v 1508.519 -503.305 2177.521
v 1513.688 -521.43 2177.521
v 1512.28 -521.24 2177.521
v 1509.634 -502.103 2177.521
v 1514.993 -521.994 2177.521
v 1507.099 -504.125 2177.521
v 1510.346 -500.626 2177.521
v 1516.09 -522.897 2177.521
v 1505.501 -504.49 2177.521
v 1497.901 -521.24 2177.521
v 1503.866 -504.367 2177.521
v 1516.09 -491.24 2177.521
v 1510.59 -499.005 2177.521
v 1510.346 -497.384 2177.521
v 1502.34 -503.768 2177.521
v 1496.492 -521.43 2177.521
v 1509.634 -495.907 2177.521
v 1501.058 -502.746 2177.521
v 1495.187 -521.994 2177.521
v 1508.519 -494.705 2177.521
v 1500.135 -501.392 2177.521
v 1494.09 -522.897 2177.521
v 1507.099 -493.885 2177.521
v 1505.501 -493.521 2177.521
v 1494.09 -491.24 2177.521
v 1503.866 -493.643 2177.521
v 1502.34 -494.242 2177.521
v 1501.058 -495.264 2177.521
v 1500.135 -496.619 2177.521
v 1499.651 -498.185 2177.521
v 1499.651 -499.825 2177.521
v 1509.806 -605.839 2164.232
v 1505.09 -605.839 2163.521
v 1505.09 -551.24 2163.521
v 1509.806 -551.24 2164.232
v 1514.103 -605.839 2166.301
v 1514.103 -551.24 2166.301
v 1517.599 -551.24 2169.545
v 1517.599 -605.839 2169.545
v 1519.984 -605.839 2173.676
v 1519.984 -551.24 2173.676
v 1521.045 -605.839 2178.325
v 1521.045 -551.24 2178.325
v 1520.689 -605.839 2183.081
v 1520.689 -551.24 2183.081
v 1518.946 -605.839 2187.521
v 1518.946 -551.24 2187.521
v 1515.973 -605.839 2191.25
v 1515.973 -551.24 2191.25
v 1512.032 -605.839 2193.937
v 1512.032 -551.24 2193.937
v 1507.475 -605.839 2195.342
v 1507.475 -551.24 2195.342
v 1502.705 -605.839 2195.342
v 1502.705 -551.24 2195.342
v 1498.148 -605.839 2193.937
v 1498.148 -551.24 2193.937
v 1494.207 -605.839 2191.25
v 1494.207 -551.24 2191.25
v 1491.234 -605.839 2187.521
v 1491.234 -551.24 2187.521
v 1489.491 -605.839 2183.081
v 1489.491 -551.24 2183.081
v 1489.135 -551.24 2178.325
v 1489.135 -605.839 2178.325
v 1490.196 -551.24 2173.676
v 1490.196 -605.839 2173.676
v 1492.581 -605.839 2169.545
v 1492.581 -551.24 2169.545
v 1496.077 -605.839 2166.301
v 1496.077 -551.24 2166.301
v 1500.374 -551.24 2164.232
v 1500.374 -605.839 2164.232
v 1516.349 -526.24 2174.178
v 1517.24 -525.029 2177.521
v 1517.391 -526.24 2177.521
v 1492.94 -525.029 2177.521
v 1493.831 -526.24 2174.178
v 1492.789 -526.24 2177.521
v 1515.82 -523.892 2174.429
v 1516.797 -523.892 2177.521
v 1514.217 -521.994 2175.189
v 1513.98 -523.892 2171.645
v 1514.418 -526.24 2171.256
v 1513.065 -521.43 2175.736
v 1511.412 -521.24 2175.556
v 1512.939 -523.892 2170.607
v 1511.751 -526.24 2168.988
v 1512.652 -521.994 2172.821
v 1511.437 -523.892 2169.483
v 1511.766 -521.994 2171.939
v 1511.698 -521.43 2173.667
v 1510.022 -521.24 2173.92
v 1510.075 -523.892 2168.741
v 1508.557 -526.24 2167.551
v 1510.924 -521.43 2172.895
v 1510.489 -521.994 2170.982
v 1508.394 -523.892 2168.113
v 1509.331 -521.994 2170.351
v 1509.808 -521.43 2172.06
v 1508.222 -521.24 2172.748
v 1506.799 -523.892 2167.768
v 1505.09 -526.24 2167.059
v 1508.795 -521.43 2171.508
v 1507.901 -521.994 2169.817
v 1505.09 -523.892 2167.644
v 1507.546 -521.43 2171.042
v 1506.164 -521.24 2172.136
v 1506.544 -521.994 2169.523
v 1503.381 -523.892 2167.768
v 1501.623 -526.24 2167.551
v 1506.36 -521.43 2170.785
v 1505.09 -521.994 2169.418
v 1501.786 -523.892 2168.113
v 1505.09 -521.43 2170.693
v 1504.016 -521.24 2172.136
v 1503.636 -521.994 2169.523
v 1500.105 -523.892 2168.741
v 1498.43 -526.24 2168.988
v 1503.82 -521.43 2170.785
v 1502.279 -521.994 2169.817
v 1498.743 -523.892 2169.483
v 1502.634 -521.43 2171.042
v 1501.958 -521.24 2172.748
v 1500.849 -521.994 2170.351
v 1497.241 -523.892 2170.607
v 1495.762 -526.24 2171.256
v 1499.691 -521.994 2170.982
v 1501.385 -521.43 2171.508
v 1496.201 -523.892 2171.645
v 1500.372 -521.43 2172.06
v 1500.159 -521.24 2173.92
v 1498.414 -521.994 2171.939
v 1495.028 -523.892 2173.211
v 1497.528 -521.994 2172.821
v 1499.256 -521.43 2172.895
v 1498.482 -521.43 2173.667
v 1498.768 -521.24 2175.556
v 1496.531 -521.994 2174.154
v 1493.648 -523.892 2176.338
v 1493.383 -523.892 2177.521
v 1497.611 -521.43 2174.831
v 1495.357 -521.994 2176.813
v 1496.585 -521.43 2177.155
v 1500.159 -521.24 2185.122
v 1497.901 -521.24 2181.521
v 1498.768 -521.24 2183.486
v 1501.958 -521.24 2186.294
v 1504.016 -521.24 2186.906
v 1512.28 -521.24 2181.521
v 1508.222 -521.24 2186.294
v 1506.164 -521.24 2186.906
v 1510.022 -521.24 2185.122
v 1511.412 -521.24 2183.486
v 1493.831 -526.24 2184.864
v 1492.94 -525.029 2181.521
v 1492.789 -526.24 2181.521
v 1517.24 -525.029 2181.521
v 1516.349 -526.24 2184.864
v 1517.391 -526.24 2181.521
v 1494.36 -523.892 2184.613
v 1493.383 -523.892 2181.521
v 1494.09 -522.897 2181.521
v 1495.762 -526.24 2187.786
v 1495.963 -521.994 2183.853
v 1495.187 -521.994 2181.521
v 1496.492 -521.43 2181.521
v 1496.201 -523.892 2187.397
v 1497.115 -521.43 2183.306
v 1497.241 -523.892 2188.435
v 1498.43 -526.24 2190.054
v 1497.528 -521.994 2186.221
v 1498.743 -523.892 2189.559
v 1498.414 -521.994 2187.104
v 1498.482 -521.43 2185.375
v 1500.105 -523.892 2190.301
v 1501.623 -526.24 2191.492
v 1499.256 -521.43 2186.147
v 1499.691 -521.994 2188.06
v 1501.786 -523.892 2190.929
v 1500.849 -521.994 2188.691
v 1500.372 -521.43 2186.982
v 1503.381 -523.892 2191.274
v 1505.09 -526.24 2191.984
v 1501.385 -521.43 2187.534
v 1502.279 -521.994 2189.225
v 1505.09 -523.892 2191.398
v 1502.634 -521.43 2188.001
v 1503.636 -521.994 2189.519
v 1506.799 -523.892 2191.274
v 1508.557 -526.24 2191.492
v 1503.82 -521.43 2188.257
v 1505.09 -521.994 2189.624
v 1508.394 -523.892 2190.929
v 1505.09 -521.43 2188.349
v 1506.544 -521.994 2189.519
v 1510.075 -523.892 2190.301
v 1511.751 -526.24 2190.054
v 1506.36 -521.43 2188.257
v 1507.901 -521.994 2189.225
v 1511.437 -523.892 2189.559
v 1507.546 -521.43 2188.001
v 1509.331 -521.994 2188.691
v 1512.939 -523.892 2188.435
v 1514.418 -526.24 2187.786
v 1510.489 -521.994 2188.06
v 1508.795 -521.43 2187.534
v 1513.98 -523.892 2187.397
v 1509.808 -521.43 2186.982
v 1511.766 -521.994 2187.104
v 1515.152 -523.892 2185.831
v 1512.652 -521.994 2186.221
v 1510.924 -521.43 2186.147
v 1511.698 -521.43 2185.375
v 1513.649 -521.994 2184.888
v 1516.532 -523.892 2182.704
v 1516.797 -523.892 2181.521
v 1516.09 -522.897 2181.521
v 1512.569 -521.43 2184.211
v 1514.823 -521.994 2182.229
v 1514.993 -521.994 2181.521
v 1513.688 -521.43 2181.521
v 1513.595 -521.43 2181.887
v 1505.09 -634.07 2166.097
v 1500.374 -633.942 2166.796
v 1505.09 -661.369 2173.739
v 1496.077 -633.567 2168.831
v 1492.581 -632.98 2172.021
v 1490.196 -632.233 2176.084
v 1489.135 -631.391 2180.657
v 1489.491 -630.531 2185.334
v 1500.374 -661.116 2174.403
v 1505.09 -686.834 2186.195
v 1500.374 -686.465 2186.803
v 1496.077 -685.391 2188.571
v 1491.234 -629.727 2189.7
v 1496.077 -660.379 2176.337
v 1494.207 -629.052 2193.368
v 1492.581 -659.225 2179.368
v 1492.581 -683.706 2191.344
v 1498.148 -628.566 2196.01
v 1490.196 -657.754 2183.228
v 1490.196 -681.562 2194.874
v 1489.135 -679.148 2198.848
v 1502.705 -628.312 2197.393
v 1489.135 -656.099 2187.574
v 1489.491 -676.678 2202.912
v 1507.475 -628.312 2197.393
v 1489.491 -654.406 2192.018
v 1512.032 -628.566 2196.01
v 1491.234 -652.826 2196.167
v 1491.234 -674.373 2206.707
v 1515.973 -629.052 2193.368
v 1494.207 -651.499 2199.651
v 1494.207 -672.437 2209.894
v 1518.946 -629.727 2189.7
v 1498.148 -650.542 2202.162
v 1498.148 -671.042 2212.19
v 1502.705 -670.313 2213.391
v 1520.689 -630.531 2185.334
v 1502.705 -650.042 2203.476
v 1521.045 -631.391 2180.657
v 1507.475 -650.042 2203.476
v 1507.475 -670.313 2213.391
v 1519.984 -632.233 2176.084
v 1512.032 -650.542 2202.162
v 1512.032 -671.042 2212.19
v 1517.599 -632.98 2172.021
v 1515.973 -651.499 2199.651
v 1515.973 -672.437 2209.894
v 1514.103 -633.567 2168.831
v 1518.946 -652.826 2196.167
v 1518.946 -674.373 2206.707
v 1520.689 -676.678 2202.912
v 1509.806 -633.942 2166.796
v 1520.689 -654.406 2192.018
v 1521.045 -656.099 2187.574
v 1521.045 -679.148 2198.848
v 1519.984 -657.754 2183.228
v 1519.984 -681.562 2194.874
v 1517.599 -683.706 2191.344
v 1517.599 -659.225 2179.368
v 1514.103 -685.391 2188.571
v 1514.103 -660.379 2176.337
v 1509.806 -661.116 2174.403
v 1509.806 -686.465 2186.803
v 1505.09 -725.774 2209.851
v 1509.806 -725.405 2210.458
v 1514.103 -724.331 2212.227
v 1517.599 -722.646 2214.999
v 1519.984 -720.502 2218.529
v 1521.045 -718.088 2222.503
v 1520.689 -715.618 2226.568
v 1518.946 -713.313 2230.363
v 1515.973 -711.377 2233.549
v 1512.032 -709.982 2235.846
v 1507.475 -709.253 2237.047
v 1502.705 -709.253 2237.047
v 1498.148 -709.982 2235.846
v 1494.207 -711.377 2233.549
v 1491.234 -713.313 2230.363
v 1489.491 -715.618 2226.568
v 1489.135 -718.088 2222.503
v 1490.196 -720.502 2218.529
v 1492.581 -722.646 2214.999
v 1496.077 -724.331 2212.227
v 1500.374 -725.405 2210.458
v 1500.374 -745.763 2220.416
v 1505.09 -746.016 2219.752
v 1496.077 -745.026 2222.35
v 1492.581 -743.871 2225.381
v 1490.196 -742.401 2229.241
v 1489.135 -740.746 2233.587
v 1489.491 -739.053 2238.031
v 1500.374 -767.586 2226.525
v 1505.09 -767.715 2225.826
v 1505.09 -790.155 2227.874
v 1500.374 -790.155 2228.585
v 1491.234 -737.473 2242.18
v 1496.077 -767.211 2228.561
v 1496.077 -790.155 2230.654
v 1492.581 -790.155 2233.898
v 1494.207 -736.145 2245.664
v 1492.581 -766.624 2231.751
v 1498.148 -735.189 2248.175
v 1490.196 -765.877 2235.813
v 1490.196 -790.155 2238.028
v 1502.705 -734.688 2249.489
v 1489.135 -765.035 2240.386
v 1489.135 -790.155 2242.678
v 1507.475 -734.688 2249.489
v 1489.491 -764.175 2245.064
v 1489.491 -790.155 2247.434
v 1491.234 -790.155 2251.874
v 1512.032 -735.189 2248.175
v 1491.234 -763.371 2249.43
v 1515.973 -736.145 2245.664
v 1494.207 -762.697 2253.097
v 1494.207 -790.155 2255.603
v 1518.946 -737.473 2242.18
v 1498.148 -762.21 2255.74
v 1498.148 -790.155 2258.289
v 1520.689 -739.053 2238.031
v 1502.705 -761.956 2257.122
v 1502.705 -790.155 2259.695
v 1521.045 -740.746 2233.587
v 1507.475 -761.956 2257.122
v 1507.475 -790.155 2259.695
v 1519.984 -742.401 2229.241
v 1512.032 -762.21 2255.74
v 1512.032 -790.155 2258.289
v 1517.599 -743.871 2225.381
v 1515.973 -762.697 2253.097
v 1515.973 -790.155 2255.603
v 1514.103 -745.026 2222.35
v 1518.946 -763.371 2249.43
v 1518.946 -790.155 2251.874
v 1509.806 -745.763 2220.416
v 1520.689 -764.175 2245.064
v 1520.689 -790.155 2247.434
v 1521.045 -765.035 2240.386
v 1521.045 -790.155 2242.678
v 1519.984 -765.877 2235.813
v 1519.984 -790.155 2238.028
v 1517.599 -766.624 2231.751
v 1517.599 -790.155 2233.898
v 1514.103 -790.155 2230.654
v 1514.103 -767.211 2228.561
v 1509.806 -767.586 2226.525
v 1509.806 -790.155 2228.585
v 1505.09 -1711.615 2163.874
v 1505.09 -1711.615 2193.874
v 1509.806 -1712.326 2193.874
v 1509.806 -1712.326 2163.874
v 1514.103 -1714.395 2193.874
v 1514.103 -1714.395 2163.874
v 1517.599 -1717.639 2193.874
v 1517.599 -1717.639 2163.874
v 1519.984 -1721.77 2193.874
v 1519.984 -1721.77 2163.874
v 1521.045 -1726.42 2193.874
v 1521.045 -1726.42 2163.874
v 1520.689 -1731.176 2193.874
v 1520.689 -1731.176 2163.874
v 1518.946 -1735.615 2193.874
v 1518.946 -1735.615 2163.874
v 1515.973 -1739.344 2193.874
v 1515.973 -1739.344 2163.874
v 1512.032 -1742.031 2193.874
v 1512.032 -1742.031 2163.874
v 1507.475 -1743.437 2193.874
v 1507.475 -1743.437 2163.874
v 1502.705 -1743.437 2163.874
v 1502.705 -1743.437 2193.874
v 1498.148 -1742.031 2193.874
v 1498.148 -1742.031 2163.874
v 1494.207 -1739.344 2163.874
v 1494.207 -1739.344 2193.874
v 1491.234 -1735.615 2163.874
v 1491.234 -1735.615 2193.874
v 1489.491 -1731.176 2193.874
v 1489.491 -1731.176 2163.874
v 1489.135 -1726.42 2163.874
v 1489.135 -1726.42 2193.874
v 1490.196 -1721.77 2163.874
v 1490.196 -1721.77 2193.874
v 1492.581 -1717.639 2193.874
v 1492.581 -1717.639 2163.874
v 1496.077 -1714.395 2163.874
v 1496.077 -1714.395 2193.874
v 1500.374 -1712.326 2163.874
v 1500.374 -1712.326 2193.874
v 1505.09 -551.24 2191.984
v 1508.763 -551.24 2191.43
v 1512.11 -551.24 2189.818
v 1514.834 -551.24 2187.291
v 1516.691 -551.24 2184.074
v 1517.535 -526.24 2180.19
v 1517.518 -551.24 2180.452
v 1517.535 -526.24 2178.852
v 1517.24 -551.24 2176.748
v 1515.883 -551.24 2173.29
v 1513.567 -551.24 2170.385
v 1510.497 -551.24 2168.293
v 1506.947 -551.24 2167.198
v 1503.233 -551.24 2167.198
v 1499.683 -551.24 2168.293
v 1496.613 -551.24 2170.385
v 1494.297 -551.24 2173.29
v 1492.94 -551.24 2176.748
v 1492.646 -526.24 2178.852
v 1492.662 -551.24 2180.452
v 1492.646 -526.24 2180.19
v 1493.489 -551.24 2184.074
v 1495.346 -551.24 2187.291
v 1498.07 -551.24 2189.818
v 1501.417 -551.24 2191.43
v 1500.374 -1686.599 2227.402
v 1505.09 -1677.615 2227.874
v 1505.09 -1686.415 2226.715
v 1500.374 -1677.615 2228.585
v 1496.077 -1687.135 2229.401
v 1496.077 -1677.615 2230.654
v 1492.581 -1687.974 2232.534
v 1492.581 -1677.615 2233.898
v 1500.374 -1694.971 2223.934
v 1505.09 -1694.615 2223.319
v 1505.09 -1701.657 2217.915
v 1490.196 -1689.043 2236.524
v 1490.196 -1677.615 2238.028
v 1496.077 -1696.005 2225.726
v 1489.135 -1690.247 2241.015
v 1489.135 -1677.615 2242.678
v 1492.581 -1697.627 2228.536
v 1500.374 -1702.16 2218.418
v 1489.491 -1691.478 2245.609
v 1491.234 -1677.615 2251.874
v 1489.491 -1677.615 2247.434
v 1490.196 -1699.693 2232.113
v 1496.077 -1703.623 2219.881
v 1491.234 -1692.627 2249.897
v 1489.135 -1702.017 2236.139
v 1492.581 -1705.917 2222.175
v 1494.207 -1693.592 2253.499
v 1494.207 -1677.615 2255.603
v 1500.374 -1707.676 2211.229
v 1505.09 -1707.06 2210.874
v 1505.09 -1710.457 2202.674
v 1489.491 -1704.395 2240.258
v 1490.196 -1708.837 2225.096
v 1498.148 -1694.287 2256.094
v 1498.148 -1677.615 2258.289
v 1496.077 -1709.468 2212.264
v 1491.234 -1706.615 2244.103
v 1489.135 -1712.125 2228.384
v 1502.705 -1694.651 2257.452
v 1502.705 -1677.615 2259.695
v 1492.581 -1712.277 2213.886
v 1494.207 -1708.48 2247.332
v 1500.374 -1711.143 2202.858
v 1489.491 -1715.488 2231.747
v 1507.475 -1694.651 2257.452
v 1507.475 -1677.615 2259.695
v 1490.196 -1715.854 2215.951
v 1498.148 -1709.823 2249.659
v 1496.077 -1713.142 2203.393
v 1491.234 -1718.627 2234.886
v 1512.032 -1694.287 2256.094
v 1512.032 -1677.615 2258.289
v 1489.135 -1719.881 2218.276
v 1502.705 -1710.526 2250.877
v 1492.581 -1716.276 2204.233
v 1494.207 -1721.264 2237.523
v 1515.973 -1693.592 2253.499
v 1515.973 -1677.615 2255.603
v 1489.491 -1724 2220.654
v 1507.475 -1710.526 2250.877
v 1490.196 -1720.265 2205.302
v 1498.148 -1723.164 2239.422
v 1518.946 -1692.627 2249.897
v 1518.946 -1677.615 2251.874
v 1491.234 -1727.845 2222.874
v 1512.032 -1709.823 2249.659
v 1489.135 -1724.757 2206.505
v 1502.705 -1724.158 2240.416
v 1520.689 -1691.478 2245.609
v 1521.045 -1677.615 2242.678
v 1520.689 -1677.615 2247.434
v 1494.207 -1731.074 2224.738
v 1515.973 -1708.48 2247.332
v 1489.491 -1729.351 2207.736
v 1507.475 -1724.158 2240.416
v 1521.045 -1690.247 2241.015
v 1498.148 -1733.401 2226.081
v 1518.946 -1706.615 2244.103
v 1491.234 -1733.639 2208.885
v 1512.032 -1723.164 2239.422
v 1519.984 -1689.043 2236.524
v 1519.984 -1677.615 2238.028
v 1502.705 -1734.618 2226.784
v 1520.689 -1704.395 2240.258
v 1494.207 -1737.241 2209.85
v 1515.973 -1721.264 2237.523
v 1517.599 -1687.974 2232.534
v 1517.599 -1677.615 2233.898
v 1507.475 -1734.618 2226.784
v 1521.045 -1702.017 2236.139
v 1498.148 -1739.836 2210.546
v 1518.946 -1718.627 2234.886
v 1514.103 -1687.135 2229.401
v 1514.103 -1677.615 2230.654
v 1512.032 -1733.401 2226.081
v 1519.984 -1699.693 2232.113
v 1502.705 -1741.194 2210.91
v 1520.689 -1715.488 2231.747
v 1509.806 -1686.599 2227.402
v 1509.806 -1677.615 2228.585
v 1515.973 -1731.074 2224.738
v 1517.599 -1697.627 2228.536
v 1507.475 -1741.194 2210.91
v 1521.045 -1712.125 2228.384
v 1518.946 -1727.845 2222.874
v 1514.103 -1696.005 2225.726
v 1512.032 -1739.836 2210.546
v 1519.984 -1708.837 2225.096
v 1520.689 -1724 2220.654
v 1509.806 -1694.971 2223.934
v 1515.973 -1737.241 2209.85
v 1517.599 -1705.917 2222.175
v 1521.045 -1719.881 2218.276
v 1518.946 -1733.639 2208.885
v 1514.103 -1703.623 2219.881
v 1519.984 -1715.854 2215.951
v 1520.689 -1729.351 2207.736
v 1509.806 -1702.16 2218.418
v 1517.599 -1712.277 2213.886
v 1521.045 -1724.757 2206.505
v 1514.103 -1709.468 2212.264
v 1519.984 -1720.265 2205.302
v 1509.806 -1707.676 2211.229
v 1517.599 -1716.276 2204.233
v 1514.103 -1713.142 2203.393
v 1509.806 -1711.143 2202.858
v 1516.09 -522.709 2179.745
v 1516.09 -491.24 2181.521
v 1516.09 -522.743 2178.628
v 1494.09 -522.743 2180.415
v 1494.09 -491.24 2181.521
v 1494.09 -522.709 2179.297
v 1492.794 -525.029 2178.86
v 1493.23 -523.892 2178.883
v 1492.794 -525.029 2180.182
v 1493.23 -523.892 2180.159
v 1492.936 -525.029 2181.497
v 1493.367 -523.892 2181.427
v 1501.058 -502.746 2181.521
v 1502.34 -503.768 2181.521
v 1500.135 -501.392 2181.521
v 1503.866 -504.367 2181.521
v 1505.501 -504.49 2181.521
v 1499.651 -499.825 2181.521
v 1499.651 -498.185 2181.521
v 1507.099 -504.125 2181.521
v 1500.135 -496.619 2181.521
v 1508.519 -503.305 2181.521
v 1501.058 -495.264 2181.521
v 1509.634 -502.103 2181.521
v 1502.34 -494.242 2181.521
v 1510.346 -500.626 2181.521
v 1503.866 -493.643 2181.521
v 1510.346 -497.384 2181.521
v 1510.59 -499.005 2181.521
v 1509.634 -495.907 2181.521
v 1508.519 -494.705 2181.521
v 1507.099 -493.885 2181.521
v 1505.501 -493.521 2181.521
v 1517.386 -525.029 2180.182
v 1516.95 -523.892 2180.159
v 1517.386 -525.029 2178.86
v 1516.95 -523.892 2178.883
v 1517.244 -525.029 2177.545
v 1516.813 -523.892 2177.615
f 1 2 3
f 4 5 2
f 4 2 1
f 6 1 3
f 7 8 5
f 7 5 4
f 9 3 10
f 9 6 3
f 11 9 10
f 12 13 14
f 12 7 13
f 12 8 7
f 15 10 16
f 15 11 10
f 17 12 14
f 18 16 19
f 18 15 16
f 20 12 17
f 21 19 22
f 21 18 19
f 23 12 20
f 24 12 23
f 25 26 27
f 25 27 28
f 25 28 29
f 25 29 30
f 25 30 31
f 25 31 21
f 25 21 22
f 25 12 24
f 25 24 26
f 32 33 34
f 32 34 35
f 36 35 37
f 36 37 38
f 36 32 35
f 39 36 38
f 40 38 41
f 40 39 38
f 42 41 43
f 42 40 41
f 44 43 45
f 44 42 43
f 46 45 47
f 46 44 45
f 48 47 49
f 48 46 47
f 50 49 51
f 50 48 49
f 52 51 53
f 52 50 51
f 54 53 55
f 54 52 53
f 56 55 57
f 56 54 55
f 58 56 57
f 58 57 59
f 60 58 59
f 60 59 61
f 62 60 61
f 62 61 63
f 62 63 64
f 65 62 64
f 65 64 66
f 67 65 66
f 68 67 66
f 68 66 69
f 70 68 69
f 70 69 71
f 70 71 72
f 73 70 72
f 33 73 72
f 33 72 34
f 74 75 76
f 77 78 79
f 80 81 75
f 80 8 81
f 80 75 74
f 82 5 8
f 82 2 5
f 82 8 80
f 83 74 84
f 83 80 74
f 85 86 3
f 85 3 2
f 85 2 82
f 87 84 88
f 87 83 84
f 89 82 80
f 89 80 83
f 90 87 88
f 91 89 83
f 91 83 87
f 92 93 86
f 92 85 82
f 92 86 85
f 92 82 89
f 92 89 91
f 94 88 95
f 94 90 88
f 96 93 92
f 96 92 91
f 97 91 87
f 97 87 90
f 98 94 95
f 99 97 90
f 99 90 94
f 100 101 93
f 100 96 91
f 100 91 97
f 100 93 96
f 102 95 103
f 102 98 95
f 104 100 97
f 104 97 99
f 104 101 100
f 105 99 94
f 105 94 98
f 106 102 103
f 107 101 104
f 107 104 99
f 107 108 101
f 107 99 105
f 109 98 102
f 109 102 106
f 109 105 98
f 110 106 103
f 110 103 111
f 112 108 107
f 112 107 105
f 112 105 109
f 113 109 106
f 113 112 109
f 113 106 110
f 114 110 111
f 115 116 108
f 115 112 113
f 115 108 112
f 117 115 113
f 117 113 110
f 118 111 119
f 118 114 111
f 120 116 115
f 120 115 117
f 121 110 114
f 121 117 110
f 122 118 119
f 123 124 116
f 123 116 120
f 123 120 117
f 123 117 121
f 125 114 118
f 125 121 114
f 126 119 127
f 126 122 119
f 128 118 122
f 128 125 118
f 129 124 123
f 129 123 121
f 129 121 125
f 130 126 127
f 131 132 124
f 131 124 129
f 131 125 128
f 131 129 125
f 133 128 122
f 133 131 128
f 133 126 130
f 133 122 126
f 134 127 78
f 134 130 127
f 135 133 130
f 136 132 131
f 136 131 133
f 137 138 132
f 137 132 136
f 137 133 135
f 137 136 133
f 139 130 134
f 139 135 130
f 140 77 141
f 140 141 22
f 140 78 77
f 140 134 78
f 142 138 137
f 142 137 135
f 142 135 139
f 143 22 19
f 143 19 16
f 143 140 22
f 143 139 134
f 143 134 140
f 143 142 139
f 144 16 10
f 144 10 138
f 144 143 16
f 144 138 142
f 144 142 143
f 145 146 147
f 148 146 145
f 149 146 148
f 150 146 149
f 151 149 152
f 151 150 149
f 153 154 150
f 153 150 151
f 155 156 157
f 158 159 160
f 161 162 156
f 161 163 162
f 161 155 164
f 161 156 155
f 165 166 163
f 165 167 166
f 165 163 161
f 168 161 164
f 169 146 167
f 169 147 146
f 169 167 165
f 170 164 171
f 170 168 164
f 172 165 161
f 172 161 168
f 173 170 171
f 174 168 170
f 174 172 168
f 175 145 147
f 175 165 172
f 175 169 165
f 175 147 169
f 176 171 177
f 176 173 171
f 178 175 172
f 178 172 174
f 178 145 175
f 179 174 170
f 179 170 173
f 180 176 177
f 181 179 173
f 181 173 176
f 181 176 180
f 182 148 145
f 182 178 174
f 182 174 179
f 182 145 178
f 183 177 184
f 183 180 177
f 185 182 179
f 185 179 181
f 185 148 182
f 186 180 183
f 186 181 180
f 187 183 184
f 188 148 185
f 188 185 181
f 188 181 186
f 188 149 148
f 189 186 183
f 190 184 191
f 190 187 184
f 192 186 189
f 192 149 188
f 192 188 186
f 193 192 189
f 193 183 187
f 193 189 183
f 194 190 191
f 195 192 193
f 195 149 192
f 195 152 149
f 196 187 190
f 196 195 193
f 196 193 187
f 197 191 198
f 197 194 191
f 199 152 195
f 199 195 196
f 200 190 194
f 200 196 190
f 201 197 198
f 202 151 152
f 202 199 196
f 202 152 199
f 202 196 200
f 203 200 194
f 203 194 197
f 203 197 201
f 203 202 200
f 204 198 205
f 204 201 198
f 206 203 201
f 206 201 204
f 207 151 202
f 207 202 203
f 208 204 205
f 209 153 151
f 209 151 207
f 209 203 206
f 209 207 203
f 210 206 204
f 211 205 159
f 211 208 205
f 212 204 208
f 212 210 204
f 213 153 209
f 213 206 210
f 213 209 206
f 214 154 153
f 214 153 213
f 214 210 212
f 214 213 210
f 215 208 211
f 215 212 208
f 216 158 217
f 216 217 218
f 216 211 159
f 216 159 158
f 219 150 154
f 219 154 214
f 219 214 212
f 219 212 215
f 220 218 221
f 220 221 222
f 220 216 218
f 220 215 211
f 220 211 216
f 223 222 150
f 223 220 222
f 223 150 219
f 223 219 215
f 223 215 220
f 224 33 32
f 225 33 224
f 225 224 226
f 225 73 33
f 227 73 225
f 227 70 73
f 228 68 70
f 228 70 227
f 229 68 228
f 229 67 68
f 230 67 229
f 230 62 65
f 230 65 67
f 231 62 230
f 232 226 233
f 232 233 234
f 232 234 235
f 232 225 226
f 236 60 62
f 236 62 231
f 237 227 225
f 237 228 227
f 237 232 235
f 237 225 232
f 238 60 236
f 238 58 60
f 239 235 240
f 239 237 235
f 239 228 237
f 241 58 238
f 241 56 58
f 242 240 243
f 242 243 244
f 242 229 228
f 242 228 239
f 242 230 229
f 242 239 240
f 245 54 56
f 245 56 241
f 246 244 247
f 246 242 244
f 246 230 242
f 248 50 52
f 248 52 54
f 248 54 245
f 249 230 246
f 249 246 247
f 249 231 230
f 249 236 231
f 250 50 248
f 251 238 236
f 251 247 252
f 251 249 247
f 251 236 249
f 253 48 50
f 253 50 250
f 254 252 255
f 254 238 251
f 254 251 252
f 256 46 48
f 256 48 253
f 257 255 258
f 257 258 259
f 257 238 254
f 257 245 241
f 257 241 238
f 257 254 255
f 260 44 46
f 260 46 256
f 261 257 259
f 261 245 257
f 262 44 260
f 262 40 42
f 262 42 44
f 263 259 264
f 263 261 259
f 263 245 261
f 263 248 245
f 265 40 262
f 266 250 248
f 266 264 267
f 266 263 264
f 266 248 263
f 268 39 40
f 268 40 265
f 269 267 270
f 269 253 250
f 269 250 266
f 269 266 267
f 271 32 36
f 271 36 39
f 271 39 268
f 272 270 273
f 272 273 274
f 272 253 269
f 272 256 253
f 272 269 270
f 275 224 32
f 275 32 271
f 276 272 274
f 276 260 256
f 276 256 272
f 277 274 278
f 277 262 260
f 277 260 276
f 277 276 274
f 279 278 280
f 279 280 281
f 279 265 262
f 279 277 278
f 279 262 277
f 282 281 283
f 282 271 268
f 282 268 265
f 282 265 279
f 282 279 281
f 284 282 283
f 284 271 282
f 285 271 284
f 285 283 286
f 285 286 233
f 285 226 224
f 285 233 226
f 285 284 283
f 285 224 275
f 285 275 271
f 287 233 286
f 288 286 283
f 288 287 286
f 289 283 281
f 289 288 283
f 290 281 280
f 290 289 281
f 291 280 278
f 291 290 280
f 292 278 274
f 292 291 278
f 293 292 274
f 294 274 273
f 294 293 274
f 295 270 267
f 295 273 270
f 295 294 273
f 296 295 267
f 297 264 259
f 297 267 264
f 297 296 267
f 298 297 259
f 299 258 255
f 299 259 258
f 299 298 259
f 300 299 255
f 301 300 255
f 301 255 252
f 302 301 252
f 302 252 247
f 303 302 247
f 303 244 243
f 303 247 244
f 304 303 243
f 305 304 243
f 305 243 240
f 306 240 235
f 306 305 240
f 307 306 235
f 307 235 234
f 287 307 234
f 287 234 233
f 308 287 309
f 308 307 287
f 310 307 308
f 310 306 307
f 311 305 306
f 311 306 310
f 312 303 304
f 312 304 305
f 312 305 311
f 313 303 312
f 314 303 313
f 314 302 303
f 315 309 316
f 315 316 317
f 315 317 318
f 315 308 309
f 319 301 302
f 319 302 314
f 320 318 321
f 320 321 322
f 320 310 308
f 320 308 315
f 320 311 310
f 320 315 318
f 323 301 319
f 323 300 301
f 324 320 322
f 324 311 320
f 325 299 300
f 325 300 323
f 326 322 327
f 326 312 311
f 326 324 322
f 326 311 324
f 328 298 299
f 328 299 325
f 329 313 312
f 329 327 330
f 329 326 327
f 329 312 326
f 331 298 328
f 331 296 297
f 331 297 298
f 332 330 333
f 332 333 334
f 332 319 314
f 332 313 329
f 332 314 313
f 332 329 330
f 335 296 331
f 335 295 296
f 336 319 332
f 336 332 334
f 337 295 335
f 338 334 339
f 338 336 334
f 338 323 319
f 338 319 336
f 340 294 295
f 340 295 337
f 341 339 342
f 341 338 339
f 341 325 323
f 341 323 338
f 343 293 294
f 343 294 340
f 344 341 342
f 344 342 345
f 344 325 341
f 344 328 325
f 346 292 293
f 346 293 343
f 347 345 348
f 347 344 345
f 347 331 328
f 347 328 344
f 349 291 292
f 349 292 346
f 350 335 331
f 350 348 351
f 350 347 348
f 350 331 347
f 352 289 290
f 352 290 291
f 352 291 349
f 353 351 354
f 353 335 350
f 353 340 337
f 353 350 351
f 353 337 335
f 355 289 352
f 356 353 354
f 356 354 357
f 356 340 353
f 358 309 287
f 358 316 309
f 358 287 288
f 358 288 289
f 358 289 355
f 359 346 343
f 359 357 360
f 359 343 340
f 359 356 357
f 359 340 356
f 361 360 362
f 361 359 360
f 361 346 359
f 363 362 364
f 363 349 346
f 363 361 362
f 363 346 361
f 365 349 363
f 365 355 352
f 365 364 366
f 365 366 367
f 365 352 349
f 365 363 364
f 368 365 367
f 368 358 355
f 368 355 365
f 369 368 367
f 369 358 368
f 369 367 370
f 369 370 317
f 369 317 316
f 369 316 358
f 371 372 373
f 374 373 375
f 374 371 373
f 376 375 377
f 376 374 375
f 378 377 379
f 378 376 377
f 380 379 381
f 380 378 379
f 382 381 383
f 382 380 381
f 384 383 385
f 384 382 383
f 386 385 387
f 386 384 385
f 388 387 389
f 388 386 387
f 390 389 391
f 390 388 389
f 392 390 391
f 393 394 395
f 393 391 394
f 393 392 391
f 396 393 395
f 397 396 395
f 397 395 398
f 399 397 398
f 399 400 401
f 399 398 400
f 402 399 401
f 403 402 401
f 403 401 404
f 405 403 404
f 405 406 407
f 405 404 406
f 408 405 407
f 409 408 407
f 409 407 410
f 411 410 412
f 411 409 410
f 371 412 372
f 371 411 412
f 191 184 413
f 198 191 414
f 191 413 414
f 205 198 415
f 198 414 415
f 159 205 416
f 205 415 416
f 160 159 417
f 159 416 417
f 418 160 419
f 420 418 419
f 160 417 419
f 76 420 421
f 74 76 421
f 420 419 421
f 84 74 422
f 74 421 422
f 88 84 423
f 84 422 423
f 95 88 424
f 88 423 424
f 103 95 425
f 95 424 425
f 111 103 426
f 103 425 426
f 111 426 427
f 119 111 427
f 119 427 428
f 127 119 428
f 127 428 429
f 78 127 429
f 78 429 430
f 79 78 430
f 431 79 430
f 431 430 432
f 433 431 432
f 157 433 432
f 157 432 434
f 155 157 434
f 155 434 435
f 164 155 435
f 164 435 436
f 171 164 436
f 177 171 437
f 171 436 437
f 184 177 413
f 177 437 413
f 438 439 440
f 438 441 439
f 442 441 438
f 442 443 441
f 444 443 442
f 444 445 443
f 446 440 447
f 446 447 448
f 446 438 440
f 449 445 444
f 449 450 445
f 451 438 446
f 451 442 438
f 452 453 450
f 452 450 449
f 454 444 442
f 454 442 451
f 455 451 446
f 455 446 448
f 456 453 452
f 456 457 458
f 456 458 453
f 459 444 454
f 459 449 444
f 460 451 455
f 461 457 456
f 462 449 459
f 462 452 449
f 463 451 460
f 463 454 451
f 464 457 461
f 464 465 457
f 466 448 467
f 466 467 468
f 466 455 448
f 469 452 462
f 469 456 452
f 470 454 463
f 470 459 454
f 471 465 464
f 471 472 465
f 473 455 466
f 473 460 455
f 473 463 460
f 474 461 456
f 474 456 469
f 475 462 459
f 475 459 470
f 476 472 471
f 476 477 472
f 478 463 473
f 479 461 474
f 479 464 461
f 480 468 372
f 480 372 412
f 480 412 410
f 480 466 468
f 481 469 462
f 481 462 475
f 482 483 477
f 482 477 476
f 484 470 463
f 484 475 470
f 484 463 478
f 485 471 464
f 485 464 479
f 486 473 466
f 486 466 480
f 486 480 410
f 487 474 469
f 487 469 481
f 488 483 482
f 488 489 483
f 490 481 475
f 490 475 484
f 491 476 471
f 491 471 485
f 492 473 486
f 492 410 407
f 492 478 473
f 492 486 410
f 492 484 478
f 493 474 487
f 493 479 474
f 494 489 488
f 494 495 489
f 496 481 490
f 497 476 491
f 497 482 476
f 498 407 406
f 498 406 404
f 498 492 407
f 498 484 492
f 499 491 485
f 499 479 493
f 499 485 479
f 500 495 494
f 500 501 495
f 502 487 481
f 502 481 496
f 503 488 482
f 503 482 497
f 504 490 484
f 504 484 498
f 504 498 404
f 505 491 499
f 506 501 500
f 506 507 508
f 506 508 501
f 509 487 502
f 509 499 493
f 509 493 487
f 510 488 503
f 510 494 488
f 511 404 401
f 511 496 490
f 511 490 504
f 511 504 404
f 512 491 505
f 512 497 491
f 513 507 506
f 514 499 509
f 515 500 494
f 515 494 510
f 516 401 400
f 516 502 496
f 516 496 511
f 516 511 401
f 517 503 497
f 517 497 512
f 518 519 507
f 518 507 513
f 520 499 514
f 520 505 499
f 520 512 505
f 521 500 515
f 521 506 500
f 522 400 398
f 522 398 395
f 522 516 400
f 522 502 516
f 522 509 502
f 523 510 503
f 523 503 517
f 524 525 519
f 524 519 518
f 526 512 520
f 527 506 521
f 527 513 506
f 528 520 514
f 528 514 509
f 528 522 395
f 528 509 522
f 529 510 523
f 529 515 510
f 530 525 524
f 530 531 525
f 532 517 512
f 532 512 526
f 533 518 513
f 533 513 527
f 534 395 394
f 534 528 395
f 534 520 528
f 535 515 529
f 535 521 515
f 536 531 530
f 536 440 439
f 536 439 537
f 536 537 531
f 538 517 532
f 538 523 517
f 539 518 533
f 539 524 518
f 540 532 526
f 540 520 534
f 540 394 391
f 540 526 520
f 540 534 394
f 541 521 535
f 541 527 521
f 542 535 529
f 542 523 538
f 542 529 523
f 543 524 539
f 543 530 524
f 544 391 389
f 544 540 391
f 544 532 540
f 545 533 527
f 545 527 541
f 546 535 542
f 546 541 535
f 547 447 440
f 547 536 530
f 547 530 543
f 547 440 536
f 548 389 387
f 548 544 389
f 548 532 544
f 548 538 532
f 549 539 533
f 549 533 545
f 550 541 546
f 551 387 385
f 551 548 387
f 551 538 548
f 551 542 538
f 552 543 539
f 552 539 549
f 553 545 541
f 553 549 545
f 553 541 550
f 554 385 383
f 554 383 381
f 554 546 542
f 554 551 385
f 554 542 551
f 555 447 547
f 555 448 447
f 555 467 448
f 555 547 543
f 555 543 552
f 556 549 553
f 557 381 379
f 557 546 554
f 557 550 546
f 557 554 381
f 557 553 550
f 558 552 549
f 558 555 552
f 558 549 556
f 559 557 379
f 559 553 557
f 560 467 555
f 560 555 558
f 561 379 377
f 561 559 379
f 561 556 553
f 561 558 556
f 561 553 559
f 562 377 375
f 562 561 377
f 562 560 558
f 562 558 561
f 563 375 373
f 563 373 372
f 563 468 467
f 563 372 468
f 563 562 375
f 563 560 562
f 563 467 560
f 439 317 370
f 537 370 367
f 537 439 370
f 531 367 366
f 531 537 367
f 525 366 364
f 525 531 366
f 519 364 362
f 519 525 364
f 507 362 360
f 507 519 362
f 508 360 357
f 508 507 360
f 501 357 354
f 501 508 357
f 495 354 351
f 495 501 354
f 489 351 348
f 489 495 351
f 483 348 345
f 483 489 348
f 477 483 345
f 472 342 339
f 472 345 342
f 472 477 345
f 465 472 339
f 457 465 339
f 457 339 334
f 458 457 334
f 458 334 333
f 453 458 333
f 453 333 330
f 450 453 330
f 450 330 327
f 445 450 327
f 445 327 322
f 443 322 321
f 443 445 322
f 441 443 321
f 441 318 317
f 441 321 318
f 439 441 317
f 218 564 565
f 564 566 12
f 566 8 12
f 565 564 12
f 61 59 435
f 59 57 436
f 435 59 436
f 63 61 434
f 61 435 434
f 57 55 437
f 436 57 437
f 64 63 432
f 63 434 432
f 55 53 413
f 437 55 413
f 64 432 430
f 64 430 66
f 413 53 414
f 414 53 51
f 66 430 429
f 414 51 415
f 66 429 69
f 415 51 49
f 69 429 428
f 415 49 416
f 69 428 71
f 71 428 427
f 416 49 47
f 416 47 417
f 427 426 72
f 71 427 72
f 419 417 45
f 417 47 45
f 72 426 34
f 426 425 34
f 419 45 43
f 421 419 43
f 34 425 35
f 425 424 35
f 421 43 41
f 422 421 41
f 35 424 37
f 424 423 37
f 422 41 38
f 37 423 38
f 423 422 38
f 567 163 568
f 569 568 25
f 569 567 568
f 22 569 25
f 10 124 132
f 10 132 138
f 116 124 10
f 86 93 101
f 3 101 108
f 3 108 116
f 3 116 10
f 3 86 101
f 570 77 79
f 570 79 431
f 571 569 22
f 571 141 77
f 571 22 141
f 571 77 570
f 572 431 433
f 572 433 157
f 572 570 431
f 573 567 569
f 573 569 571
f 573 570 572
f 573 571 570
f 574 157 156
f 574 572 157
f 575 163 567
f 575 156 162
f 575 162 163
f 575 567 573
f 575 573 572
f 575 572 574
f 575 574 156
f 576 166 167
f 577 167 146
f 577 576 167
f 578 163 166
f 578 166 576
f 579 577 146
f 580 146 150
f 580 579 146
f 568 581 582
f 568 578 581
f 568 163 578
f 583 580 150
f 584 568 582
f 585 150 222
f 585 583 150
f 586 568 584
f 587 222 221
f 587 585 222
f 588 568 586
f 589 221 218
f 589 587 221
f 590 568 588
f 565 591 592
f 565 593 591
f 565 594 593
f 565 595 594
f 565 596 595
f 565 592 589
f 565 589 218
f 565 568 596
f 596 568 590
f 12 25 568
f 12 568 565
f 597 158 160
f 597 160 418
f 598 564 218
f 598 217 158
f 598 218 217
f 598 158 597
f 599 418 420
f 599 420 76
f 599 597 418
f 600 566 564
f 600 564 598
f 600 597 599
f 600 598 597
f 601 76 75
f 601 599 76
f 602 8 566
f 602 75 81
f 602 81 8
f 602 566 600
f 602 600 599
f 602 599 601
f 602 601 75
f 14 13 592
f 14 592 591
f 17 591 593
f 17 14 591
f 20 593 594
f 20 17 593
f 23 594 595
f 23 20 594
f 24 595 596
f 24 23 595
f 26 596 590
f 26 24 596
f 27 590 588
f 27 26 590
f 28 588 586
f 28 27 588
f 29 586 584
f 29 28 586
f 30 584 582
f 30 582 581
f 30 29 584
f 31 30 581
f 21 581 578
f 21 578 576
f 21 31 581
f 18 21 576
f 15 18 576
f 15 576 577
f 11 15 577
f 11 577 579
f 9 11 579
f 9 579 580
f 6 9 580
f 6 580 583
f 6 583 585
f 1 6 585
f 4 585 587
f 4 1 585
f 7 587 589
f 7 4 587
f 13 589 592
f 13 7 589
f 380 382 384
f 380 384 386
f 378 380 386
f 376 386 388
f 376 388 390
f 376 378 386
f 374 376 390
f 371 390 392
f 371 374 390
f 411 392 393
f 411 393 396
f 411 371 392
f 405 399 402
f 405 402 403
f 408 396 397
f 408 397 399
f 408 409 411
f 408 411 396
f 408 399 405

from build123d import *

# Parameters (mm, degrees)
BARRER1_PROFILE_R            = 16
CROQUIS13_R                  = 12.462499683
SALIENTE_EXTRUIR1_DEPTH      = 30
SALIENTE_EXTRUIR2_DEPTH      = 2
SALIENTE_EXTRUIR2_DEPTH_BACK = 2
CROQUIS15_W                  = 22
CROQUIS15_H                  = 30
CROQUIS15_R                  = 5.5
REDONDEO1_R                  = 5


with BuildPart() as part:
    # Barrer1: sweep along a curve in space
    with BuildLine() as barrer1_path:
        Line((1505.090032208, -551.240046142, 2179.521039666), (1505.090032208, -605.839285822, 2179.521039666))
        ThreePointArc((1505.090032208, -605.839285822, 2179.521039666), (1505.090032208, -643.580384492, 2184.704091655), (1505.090032208, -678.526996356, 2199.869475793))
        Line((1505.090032208, -678.526996356, 2199.869475793), (1505.090032208, -717.466920568, 2223.52527976))
        ThreePointArc((1505.090032208, -717.466920568, 2223.52527976), (1505.090032208, -752.413532431, 2238.690663898), (1505.090032208, -790.154631102, 2243.873715887))
        Line((1505.090032208, -790.154631102, 2243.873715887), (1505.090032208, -1677.615278398, 2243.873715887))
        ThreePointArc((1505.090032208, -1677.615278398, 2243.873715887), (1505.090032208, -1712.970617457, 2229.229054946), (1505.090032208, -1727.615278398, 2193.873715887))
        Line((1505.090032208, -1727.615278398, 2193.873715887), (1505.090032208, -1727.615278398, 2163.873715887))
    # Barrer1 profile (on start of the path) → Barrer1 (sweep)
    with BuildSketch(Plane(origin=(1505.090032208, -551.240046142, 2179.521039666), x_dir=(0, 0, -1), z_dir=(0, -1, 0))):
        Circle(BARRER1_PROFILE_R)
    sweep(path=barrer1_path.line)

    # Croquis13 → Saliente-Extruir1 (add)
    with BuildSketch(Plane(origin=(0, -551.240046142, 0), x_dir=(1, 0, 0), z_dir=(0, 1, 0))):
        with Locations(Location((1505.090032208, -2179.521039666, 0), (0, 0, 270))):
            Circle(CROQUIS13_R)
    extrude(amount=SALIENTE_EXTRUIR1_DEPTH)

    # Croquis15 → Saliente-Extruir2 (add, two sides: drawn at the far end of the back side and taken through both)
    with BuildSketch(Plane.XY.offset(2179.521039666).offset(-SALIENTE_EXTRUIR2_DEPTH_BACK)):
        with Locations((1505.090032208, -506.240046142)):
            Rectangle(CROQUIS15_W, CROQUIS15_H)
        with Locations((1505.090032208, -499.005171033)):
            Circle(CROQUIS15_R, mode=Mode.SUBTRACT)
    extrude(amount=SALIENTE_EXTRUIR2_DEPTH + SALIENTE_EXTRUIR2_DEPTH_BACK)

    # Redondeo1
    # the kernel refuses this fillet: 5 mm, written as the material it takes off along each edge
    with BuildSketch(Plane(origin=(1505.090032208, -521.240046142, 2179.521039666), x_dir=(0, 0, 1), z_dir=(-1, 0, 0))) as redondeo1_piece_1_section:
        with BuildLine():
            CenterArc((12.462499683 - REDONDEO1_R, -REDONDEO1_R), REDONDEO1_R, 0, 90)
            Line((12.462499683 - REDONDEO1_R, 0), (12.462499683, 0))
            Line((12.462499683, 0), (12.462499683, -REDONDEO1_R))
        make_face()
    redondeo1_piece_1 = revolve(axis=Axis((1505.090032208, -521.240046142, 2179.521039666), (0, 1, 0)), mode=Mode.PRIVATE)
    redondeo1_piece_1 = split(redondeo1_piece_1, bisect_by=Plane(origin=(1512.161144528, -522.66682116, 2181.521039666), z_dir=(0, 0, 1)), keep=Keep.TOP, mode=Mode.PRIVATE)
    add(redondeo1_piece_1, mode=Mode.SUBTRACT)
    with BuildSketch(Plane(origin=(1505.090032208, -521.240046142, 2179.521039666), x_dir=(0, 0, 1), z_dir=(-1, 0, 0))) as redondeo1_piece_2_section:
        with BuildLine():
            CenterArc((12.462499683 - REDONDEO1_R, -REDONDEO1_R), REDONDEO1_R, 0, 90)
            Line((12.462499683 - REDONDEO1_R, 0), (12.462499683, 0))
            Line((12.462499683, 0), (12.462499683, -REDONDEO1_R))
        make_face()
    redondeo1_piece_2 = revolve(axis=Axis((1505.090032208, -521.240046142, 2179.521039666), (0, 1, 0)), mode=Mode.PRIVATE)
    redondeo1_piece_2 = split(redondeo1_piece_2, bisect_by=Plane(origin=(1505.090032208, -522.66682116, 2177.521039666), z_dir=(0, 0, -1)), keep=Keep.TOP, mode=Mode.PRIVATE)
    add(redondeo1_piece_2, mode=Mode.SUBTRACT)
    with BuildSketch(Plane(origin=(1505.090032208, -521.240046142, 2179.521039666), x_dir=(0, 0, 1), z_dir=(-1, 0, 0))) as redondeo1_piece_3_section:
        with BuildLine():
            CenterArc((12.462499683 - REDONDEO1_R, -REDONDEO1_R), REDONDEO1_R, 0, 90)
            Line((12.462499683 - REDONDEO1_R, 0), (12.462499683, 0))
            Line((12.462499683, 0), (12.462499683, -REDONDEO1_R))
        make_face()
    redondeo1_piece_3 = revolve(axis=Axis((1505.090032208, -521.240046142, 2179.521039666), (0, 1, 0)), mode=Mode.PRIVATE)
    redondeo1_piece_3 = split(redondeo1_piece_3, bisect_by=Plane(origin=(1516.090032208, -522.670135024, 2179.521039666), z_dir=(1, 0, 0)), keep=Keep.TOP, mode=Mode.PRIVATE)
    add(redondeo1_piece_3, mode=Mode.SUBTRACT)
    with BuildSketch(Plane(origin=(1505.090032208, -521.240046142, 2179.521039666), x_dir=(0, 0, 1), z_dir=(-1, 0, 0))) as redondeo1_piece_4_section:
        with BuildLine():
            CenterArc((12.462499683 - REDONDEO1_R, -REDONDEO1_R), REDONDEO1_R, 0, 90)
            Line((12.462499683 - REDONDEO1_R, 0), (12.462499683, 0))
            Line((12.462499683, 0), (12.462499683, -REDONDEO1_R))
        make_face()
    redondeo1_piece_4 = revolve(axis=Axis((1505.090032208, -521.240046142, 2179.521039666), (0, 1, 0)), mode=Mode.PRIVATE)
    redondeo1_piece_4 = split(redondeo1_piece_4, bisect_by=Plane(origin=(1494.090032208, -522.670134816, 2179.521039666), z_dir=(-1, 0, 0)), keep=Keep.TOP, mode=Mode.PRIVATE)
    add(redondeo1_piece_4, mode=Mode.SUBTRACT)


solid = part.part
